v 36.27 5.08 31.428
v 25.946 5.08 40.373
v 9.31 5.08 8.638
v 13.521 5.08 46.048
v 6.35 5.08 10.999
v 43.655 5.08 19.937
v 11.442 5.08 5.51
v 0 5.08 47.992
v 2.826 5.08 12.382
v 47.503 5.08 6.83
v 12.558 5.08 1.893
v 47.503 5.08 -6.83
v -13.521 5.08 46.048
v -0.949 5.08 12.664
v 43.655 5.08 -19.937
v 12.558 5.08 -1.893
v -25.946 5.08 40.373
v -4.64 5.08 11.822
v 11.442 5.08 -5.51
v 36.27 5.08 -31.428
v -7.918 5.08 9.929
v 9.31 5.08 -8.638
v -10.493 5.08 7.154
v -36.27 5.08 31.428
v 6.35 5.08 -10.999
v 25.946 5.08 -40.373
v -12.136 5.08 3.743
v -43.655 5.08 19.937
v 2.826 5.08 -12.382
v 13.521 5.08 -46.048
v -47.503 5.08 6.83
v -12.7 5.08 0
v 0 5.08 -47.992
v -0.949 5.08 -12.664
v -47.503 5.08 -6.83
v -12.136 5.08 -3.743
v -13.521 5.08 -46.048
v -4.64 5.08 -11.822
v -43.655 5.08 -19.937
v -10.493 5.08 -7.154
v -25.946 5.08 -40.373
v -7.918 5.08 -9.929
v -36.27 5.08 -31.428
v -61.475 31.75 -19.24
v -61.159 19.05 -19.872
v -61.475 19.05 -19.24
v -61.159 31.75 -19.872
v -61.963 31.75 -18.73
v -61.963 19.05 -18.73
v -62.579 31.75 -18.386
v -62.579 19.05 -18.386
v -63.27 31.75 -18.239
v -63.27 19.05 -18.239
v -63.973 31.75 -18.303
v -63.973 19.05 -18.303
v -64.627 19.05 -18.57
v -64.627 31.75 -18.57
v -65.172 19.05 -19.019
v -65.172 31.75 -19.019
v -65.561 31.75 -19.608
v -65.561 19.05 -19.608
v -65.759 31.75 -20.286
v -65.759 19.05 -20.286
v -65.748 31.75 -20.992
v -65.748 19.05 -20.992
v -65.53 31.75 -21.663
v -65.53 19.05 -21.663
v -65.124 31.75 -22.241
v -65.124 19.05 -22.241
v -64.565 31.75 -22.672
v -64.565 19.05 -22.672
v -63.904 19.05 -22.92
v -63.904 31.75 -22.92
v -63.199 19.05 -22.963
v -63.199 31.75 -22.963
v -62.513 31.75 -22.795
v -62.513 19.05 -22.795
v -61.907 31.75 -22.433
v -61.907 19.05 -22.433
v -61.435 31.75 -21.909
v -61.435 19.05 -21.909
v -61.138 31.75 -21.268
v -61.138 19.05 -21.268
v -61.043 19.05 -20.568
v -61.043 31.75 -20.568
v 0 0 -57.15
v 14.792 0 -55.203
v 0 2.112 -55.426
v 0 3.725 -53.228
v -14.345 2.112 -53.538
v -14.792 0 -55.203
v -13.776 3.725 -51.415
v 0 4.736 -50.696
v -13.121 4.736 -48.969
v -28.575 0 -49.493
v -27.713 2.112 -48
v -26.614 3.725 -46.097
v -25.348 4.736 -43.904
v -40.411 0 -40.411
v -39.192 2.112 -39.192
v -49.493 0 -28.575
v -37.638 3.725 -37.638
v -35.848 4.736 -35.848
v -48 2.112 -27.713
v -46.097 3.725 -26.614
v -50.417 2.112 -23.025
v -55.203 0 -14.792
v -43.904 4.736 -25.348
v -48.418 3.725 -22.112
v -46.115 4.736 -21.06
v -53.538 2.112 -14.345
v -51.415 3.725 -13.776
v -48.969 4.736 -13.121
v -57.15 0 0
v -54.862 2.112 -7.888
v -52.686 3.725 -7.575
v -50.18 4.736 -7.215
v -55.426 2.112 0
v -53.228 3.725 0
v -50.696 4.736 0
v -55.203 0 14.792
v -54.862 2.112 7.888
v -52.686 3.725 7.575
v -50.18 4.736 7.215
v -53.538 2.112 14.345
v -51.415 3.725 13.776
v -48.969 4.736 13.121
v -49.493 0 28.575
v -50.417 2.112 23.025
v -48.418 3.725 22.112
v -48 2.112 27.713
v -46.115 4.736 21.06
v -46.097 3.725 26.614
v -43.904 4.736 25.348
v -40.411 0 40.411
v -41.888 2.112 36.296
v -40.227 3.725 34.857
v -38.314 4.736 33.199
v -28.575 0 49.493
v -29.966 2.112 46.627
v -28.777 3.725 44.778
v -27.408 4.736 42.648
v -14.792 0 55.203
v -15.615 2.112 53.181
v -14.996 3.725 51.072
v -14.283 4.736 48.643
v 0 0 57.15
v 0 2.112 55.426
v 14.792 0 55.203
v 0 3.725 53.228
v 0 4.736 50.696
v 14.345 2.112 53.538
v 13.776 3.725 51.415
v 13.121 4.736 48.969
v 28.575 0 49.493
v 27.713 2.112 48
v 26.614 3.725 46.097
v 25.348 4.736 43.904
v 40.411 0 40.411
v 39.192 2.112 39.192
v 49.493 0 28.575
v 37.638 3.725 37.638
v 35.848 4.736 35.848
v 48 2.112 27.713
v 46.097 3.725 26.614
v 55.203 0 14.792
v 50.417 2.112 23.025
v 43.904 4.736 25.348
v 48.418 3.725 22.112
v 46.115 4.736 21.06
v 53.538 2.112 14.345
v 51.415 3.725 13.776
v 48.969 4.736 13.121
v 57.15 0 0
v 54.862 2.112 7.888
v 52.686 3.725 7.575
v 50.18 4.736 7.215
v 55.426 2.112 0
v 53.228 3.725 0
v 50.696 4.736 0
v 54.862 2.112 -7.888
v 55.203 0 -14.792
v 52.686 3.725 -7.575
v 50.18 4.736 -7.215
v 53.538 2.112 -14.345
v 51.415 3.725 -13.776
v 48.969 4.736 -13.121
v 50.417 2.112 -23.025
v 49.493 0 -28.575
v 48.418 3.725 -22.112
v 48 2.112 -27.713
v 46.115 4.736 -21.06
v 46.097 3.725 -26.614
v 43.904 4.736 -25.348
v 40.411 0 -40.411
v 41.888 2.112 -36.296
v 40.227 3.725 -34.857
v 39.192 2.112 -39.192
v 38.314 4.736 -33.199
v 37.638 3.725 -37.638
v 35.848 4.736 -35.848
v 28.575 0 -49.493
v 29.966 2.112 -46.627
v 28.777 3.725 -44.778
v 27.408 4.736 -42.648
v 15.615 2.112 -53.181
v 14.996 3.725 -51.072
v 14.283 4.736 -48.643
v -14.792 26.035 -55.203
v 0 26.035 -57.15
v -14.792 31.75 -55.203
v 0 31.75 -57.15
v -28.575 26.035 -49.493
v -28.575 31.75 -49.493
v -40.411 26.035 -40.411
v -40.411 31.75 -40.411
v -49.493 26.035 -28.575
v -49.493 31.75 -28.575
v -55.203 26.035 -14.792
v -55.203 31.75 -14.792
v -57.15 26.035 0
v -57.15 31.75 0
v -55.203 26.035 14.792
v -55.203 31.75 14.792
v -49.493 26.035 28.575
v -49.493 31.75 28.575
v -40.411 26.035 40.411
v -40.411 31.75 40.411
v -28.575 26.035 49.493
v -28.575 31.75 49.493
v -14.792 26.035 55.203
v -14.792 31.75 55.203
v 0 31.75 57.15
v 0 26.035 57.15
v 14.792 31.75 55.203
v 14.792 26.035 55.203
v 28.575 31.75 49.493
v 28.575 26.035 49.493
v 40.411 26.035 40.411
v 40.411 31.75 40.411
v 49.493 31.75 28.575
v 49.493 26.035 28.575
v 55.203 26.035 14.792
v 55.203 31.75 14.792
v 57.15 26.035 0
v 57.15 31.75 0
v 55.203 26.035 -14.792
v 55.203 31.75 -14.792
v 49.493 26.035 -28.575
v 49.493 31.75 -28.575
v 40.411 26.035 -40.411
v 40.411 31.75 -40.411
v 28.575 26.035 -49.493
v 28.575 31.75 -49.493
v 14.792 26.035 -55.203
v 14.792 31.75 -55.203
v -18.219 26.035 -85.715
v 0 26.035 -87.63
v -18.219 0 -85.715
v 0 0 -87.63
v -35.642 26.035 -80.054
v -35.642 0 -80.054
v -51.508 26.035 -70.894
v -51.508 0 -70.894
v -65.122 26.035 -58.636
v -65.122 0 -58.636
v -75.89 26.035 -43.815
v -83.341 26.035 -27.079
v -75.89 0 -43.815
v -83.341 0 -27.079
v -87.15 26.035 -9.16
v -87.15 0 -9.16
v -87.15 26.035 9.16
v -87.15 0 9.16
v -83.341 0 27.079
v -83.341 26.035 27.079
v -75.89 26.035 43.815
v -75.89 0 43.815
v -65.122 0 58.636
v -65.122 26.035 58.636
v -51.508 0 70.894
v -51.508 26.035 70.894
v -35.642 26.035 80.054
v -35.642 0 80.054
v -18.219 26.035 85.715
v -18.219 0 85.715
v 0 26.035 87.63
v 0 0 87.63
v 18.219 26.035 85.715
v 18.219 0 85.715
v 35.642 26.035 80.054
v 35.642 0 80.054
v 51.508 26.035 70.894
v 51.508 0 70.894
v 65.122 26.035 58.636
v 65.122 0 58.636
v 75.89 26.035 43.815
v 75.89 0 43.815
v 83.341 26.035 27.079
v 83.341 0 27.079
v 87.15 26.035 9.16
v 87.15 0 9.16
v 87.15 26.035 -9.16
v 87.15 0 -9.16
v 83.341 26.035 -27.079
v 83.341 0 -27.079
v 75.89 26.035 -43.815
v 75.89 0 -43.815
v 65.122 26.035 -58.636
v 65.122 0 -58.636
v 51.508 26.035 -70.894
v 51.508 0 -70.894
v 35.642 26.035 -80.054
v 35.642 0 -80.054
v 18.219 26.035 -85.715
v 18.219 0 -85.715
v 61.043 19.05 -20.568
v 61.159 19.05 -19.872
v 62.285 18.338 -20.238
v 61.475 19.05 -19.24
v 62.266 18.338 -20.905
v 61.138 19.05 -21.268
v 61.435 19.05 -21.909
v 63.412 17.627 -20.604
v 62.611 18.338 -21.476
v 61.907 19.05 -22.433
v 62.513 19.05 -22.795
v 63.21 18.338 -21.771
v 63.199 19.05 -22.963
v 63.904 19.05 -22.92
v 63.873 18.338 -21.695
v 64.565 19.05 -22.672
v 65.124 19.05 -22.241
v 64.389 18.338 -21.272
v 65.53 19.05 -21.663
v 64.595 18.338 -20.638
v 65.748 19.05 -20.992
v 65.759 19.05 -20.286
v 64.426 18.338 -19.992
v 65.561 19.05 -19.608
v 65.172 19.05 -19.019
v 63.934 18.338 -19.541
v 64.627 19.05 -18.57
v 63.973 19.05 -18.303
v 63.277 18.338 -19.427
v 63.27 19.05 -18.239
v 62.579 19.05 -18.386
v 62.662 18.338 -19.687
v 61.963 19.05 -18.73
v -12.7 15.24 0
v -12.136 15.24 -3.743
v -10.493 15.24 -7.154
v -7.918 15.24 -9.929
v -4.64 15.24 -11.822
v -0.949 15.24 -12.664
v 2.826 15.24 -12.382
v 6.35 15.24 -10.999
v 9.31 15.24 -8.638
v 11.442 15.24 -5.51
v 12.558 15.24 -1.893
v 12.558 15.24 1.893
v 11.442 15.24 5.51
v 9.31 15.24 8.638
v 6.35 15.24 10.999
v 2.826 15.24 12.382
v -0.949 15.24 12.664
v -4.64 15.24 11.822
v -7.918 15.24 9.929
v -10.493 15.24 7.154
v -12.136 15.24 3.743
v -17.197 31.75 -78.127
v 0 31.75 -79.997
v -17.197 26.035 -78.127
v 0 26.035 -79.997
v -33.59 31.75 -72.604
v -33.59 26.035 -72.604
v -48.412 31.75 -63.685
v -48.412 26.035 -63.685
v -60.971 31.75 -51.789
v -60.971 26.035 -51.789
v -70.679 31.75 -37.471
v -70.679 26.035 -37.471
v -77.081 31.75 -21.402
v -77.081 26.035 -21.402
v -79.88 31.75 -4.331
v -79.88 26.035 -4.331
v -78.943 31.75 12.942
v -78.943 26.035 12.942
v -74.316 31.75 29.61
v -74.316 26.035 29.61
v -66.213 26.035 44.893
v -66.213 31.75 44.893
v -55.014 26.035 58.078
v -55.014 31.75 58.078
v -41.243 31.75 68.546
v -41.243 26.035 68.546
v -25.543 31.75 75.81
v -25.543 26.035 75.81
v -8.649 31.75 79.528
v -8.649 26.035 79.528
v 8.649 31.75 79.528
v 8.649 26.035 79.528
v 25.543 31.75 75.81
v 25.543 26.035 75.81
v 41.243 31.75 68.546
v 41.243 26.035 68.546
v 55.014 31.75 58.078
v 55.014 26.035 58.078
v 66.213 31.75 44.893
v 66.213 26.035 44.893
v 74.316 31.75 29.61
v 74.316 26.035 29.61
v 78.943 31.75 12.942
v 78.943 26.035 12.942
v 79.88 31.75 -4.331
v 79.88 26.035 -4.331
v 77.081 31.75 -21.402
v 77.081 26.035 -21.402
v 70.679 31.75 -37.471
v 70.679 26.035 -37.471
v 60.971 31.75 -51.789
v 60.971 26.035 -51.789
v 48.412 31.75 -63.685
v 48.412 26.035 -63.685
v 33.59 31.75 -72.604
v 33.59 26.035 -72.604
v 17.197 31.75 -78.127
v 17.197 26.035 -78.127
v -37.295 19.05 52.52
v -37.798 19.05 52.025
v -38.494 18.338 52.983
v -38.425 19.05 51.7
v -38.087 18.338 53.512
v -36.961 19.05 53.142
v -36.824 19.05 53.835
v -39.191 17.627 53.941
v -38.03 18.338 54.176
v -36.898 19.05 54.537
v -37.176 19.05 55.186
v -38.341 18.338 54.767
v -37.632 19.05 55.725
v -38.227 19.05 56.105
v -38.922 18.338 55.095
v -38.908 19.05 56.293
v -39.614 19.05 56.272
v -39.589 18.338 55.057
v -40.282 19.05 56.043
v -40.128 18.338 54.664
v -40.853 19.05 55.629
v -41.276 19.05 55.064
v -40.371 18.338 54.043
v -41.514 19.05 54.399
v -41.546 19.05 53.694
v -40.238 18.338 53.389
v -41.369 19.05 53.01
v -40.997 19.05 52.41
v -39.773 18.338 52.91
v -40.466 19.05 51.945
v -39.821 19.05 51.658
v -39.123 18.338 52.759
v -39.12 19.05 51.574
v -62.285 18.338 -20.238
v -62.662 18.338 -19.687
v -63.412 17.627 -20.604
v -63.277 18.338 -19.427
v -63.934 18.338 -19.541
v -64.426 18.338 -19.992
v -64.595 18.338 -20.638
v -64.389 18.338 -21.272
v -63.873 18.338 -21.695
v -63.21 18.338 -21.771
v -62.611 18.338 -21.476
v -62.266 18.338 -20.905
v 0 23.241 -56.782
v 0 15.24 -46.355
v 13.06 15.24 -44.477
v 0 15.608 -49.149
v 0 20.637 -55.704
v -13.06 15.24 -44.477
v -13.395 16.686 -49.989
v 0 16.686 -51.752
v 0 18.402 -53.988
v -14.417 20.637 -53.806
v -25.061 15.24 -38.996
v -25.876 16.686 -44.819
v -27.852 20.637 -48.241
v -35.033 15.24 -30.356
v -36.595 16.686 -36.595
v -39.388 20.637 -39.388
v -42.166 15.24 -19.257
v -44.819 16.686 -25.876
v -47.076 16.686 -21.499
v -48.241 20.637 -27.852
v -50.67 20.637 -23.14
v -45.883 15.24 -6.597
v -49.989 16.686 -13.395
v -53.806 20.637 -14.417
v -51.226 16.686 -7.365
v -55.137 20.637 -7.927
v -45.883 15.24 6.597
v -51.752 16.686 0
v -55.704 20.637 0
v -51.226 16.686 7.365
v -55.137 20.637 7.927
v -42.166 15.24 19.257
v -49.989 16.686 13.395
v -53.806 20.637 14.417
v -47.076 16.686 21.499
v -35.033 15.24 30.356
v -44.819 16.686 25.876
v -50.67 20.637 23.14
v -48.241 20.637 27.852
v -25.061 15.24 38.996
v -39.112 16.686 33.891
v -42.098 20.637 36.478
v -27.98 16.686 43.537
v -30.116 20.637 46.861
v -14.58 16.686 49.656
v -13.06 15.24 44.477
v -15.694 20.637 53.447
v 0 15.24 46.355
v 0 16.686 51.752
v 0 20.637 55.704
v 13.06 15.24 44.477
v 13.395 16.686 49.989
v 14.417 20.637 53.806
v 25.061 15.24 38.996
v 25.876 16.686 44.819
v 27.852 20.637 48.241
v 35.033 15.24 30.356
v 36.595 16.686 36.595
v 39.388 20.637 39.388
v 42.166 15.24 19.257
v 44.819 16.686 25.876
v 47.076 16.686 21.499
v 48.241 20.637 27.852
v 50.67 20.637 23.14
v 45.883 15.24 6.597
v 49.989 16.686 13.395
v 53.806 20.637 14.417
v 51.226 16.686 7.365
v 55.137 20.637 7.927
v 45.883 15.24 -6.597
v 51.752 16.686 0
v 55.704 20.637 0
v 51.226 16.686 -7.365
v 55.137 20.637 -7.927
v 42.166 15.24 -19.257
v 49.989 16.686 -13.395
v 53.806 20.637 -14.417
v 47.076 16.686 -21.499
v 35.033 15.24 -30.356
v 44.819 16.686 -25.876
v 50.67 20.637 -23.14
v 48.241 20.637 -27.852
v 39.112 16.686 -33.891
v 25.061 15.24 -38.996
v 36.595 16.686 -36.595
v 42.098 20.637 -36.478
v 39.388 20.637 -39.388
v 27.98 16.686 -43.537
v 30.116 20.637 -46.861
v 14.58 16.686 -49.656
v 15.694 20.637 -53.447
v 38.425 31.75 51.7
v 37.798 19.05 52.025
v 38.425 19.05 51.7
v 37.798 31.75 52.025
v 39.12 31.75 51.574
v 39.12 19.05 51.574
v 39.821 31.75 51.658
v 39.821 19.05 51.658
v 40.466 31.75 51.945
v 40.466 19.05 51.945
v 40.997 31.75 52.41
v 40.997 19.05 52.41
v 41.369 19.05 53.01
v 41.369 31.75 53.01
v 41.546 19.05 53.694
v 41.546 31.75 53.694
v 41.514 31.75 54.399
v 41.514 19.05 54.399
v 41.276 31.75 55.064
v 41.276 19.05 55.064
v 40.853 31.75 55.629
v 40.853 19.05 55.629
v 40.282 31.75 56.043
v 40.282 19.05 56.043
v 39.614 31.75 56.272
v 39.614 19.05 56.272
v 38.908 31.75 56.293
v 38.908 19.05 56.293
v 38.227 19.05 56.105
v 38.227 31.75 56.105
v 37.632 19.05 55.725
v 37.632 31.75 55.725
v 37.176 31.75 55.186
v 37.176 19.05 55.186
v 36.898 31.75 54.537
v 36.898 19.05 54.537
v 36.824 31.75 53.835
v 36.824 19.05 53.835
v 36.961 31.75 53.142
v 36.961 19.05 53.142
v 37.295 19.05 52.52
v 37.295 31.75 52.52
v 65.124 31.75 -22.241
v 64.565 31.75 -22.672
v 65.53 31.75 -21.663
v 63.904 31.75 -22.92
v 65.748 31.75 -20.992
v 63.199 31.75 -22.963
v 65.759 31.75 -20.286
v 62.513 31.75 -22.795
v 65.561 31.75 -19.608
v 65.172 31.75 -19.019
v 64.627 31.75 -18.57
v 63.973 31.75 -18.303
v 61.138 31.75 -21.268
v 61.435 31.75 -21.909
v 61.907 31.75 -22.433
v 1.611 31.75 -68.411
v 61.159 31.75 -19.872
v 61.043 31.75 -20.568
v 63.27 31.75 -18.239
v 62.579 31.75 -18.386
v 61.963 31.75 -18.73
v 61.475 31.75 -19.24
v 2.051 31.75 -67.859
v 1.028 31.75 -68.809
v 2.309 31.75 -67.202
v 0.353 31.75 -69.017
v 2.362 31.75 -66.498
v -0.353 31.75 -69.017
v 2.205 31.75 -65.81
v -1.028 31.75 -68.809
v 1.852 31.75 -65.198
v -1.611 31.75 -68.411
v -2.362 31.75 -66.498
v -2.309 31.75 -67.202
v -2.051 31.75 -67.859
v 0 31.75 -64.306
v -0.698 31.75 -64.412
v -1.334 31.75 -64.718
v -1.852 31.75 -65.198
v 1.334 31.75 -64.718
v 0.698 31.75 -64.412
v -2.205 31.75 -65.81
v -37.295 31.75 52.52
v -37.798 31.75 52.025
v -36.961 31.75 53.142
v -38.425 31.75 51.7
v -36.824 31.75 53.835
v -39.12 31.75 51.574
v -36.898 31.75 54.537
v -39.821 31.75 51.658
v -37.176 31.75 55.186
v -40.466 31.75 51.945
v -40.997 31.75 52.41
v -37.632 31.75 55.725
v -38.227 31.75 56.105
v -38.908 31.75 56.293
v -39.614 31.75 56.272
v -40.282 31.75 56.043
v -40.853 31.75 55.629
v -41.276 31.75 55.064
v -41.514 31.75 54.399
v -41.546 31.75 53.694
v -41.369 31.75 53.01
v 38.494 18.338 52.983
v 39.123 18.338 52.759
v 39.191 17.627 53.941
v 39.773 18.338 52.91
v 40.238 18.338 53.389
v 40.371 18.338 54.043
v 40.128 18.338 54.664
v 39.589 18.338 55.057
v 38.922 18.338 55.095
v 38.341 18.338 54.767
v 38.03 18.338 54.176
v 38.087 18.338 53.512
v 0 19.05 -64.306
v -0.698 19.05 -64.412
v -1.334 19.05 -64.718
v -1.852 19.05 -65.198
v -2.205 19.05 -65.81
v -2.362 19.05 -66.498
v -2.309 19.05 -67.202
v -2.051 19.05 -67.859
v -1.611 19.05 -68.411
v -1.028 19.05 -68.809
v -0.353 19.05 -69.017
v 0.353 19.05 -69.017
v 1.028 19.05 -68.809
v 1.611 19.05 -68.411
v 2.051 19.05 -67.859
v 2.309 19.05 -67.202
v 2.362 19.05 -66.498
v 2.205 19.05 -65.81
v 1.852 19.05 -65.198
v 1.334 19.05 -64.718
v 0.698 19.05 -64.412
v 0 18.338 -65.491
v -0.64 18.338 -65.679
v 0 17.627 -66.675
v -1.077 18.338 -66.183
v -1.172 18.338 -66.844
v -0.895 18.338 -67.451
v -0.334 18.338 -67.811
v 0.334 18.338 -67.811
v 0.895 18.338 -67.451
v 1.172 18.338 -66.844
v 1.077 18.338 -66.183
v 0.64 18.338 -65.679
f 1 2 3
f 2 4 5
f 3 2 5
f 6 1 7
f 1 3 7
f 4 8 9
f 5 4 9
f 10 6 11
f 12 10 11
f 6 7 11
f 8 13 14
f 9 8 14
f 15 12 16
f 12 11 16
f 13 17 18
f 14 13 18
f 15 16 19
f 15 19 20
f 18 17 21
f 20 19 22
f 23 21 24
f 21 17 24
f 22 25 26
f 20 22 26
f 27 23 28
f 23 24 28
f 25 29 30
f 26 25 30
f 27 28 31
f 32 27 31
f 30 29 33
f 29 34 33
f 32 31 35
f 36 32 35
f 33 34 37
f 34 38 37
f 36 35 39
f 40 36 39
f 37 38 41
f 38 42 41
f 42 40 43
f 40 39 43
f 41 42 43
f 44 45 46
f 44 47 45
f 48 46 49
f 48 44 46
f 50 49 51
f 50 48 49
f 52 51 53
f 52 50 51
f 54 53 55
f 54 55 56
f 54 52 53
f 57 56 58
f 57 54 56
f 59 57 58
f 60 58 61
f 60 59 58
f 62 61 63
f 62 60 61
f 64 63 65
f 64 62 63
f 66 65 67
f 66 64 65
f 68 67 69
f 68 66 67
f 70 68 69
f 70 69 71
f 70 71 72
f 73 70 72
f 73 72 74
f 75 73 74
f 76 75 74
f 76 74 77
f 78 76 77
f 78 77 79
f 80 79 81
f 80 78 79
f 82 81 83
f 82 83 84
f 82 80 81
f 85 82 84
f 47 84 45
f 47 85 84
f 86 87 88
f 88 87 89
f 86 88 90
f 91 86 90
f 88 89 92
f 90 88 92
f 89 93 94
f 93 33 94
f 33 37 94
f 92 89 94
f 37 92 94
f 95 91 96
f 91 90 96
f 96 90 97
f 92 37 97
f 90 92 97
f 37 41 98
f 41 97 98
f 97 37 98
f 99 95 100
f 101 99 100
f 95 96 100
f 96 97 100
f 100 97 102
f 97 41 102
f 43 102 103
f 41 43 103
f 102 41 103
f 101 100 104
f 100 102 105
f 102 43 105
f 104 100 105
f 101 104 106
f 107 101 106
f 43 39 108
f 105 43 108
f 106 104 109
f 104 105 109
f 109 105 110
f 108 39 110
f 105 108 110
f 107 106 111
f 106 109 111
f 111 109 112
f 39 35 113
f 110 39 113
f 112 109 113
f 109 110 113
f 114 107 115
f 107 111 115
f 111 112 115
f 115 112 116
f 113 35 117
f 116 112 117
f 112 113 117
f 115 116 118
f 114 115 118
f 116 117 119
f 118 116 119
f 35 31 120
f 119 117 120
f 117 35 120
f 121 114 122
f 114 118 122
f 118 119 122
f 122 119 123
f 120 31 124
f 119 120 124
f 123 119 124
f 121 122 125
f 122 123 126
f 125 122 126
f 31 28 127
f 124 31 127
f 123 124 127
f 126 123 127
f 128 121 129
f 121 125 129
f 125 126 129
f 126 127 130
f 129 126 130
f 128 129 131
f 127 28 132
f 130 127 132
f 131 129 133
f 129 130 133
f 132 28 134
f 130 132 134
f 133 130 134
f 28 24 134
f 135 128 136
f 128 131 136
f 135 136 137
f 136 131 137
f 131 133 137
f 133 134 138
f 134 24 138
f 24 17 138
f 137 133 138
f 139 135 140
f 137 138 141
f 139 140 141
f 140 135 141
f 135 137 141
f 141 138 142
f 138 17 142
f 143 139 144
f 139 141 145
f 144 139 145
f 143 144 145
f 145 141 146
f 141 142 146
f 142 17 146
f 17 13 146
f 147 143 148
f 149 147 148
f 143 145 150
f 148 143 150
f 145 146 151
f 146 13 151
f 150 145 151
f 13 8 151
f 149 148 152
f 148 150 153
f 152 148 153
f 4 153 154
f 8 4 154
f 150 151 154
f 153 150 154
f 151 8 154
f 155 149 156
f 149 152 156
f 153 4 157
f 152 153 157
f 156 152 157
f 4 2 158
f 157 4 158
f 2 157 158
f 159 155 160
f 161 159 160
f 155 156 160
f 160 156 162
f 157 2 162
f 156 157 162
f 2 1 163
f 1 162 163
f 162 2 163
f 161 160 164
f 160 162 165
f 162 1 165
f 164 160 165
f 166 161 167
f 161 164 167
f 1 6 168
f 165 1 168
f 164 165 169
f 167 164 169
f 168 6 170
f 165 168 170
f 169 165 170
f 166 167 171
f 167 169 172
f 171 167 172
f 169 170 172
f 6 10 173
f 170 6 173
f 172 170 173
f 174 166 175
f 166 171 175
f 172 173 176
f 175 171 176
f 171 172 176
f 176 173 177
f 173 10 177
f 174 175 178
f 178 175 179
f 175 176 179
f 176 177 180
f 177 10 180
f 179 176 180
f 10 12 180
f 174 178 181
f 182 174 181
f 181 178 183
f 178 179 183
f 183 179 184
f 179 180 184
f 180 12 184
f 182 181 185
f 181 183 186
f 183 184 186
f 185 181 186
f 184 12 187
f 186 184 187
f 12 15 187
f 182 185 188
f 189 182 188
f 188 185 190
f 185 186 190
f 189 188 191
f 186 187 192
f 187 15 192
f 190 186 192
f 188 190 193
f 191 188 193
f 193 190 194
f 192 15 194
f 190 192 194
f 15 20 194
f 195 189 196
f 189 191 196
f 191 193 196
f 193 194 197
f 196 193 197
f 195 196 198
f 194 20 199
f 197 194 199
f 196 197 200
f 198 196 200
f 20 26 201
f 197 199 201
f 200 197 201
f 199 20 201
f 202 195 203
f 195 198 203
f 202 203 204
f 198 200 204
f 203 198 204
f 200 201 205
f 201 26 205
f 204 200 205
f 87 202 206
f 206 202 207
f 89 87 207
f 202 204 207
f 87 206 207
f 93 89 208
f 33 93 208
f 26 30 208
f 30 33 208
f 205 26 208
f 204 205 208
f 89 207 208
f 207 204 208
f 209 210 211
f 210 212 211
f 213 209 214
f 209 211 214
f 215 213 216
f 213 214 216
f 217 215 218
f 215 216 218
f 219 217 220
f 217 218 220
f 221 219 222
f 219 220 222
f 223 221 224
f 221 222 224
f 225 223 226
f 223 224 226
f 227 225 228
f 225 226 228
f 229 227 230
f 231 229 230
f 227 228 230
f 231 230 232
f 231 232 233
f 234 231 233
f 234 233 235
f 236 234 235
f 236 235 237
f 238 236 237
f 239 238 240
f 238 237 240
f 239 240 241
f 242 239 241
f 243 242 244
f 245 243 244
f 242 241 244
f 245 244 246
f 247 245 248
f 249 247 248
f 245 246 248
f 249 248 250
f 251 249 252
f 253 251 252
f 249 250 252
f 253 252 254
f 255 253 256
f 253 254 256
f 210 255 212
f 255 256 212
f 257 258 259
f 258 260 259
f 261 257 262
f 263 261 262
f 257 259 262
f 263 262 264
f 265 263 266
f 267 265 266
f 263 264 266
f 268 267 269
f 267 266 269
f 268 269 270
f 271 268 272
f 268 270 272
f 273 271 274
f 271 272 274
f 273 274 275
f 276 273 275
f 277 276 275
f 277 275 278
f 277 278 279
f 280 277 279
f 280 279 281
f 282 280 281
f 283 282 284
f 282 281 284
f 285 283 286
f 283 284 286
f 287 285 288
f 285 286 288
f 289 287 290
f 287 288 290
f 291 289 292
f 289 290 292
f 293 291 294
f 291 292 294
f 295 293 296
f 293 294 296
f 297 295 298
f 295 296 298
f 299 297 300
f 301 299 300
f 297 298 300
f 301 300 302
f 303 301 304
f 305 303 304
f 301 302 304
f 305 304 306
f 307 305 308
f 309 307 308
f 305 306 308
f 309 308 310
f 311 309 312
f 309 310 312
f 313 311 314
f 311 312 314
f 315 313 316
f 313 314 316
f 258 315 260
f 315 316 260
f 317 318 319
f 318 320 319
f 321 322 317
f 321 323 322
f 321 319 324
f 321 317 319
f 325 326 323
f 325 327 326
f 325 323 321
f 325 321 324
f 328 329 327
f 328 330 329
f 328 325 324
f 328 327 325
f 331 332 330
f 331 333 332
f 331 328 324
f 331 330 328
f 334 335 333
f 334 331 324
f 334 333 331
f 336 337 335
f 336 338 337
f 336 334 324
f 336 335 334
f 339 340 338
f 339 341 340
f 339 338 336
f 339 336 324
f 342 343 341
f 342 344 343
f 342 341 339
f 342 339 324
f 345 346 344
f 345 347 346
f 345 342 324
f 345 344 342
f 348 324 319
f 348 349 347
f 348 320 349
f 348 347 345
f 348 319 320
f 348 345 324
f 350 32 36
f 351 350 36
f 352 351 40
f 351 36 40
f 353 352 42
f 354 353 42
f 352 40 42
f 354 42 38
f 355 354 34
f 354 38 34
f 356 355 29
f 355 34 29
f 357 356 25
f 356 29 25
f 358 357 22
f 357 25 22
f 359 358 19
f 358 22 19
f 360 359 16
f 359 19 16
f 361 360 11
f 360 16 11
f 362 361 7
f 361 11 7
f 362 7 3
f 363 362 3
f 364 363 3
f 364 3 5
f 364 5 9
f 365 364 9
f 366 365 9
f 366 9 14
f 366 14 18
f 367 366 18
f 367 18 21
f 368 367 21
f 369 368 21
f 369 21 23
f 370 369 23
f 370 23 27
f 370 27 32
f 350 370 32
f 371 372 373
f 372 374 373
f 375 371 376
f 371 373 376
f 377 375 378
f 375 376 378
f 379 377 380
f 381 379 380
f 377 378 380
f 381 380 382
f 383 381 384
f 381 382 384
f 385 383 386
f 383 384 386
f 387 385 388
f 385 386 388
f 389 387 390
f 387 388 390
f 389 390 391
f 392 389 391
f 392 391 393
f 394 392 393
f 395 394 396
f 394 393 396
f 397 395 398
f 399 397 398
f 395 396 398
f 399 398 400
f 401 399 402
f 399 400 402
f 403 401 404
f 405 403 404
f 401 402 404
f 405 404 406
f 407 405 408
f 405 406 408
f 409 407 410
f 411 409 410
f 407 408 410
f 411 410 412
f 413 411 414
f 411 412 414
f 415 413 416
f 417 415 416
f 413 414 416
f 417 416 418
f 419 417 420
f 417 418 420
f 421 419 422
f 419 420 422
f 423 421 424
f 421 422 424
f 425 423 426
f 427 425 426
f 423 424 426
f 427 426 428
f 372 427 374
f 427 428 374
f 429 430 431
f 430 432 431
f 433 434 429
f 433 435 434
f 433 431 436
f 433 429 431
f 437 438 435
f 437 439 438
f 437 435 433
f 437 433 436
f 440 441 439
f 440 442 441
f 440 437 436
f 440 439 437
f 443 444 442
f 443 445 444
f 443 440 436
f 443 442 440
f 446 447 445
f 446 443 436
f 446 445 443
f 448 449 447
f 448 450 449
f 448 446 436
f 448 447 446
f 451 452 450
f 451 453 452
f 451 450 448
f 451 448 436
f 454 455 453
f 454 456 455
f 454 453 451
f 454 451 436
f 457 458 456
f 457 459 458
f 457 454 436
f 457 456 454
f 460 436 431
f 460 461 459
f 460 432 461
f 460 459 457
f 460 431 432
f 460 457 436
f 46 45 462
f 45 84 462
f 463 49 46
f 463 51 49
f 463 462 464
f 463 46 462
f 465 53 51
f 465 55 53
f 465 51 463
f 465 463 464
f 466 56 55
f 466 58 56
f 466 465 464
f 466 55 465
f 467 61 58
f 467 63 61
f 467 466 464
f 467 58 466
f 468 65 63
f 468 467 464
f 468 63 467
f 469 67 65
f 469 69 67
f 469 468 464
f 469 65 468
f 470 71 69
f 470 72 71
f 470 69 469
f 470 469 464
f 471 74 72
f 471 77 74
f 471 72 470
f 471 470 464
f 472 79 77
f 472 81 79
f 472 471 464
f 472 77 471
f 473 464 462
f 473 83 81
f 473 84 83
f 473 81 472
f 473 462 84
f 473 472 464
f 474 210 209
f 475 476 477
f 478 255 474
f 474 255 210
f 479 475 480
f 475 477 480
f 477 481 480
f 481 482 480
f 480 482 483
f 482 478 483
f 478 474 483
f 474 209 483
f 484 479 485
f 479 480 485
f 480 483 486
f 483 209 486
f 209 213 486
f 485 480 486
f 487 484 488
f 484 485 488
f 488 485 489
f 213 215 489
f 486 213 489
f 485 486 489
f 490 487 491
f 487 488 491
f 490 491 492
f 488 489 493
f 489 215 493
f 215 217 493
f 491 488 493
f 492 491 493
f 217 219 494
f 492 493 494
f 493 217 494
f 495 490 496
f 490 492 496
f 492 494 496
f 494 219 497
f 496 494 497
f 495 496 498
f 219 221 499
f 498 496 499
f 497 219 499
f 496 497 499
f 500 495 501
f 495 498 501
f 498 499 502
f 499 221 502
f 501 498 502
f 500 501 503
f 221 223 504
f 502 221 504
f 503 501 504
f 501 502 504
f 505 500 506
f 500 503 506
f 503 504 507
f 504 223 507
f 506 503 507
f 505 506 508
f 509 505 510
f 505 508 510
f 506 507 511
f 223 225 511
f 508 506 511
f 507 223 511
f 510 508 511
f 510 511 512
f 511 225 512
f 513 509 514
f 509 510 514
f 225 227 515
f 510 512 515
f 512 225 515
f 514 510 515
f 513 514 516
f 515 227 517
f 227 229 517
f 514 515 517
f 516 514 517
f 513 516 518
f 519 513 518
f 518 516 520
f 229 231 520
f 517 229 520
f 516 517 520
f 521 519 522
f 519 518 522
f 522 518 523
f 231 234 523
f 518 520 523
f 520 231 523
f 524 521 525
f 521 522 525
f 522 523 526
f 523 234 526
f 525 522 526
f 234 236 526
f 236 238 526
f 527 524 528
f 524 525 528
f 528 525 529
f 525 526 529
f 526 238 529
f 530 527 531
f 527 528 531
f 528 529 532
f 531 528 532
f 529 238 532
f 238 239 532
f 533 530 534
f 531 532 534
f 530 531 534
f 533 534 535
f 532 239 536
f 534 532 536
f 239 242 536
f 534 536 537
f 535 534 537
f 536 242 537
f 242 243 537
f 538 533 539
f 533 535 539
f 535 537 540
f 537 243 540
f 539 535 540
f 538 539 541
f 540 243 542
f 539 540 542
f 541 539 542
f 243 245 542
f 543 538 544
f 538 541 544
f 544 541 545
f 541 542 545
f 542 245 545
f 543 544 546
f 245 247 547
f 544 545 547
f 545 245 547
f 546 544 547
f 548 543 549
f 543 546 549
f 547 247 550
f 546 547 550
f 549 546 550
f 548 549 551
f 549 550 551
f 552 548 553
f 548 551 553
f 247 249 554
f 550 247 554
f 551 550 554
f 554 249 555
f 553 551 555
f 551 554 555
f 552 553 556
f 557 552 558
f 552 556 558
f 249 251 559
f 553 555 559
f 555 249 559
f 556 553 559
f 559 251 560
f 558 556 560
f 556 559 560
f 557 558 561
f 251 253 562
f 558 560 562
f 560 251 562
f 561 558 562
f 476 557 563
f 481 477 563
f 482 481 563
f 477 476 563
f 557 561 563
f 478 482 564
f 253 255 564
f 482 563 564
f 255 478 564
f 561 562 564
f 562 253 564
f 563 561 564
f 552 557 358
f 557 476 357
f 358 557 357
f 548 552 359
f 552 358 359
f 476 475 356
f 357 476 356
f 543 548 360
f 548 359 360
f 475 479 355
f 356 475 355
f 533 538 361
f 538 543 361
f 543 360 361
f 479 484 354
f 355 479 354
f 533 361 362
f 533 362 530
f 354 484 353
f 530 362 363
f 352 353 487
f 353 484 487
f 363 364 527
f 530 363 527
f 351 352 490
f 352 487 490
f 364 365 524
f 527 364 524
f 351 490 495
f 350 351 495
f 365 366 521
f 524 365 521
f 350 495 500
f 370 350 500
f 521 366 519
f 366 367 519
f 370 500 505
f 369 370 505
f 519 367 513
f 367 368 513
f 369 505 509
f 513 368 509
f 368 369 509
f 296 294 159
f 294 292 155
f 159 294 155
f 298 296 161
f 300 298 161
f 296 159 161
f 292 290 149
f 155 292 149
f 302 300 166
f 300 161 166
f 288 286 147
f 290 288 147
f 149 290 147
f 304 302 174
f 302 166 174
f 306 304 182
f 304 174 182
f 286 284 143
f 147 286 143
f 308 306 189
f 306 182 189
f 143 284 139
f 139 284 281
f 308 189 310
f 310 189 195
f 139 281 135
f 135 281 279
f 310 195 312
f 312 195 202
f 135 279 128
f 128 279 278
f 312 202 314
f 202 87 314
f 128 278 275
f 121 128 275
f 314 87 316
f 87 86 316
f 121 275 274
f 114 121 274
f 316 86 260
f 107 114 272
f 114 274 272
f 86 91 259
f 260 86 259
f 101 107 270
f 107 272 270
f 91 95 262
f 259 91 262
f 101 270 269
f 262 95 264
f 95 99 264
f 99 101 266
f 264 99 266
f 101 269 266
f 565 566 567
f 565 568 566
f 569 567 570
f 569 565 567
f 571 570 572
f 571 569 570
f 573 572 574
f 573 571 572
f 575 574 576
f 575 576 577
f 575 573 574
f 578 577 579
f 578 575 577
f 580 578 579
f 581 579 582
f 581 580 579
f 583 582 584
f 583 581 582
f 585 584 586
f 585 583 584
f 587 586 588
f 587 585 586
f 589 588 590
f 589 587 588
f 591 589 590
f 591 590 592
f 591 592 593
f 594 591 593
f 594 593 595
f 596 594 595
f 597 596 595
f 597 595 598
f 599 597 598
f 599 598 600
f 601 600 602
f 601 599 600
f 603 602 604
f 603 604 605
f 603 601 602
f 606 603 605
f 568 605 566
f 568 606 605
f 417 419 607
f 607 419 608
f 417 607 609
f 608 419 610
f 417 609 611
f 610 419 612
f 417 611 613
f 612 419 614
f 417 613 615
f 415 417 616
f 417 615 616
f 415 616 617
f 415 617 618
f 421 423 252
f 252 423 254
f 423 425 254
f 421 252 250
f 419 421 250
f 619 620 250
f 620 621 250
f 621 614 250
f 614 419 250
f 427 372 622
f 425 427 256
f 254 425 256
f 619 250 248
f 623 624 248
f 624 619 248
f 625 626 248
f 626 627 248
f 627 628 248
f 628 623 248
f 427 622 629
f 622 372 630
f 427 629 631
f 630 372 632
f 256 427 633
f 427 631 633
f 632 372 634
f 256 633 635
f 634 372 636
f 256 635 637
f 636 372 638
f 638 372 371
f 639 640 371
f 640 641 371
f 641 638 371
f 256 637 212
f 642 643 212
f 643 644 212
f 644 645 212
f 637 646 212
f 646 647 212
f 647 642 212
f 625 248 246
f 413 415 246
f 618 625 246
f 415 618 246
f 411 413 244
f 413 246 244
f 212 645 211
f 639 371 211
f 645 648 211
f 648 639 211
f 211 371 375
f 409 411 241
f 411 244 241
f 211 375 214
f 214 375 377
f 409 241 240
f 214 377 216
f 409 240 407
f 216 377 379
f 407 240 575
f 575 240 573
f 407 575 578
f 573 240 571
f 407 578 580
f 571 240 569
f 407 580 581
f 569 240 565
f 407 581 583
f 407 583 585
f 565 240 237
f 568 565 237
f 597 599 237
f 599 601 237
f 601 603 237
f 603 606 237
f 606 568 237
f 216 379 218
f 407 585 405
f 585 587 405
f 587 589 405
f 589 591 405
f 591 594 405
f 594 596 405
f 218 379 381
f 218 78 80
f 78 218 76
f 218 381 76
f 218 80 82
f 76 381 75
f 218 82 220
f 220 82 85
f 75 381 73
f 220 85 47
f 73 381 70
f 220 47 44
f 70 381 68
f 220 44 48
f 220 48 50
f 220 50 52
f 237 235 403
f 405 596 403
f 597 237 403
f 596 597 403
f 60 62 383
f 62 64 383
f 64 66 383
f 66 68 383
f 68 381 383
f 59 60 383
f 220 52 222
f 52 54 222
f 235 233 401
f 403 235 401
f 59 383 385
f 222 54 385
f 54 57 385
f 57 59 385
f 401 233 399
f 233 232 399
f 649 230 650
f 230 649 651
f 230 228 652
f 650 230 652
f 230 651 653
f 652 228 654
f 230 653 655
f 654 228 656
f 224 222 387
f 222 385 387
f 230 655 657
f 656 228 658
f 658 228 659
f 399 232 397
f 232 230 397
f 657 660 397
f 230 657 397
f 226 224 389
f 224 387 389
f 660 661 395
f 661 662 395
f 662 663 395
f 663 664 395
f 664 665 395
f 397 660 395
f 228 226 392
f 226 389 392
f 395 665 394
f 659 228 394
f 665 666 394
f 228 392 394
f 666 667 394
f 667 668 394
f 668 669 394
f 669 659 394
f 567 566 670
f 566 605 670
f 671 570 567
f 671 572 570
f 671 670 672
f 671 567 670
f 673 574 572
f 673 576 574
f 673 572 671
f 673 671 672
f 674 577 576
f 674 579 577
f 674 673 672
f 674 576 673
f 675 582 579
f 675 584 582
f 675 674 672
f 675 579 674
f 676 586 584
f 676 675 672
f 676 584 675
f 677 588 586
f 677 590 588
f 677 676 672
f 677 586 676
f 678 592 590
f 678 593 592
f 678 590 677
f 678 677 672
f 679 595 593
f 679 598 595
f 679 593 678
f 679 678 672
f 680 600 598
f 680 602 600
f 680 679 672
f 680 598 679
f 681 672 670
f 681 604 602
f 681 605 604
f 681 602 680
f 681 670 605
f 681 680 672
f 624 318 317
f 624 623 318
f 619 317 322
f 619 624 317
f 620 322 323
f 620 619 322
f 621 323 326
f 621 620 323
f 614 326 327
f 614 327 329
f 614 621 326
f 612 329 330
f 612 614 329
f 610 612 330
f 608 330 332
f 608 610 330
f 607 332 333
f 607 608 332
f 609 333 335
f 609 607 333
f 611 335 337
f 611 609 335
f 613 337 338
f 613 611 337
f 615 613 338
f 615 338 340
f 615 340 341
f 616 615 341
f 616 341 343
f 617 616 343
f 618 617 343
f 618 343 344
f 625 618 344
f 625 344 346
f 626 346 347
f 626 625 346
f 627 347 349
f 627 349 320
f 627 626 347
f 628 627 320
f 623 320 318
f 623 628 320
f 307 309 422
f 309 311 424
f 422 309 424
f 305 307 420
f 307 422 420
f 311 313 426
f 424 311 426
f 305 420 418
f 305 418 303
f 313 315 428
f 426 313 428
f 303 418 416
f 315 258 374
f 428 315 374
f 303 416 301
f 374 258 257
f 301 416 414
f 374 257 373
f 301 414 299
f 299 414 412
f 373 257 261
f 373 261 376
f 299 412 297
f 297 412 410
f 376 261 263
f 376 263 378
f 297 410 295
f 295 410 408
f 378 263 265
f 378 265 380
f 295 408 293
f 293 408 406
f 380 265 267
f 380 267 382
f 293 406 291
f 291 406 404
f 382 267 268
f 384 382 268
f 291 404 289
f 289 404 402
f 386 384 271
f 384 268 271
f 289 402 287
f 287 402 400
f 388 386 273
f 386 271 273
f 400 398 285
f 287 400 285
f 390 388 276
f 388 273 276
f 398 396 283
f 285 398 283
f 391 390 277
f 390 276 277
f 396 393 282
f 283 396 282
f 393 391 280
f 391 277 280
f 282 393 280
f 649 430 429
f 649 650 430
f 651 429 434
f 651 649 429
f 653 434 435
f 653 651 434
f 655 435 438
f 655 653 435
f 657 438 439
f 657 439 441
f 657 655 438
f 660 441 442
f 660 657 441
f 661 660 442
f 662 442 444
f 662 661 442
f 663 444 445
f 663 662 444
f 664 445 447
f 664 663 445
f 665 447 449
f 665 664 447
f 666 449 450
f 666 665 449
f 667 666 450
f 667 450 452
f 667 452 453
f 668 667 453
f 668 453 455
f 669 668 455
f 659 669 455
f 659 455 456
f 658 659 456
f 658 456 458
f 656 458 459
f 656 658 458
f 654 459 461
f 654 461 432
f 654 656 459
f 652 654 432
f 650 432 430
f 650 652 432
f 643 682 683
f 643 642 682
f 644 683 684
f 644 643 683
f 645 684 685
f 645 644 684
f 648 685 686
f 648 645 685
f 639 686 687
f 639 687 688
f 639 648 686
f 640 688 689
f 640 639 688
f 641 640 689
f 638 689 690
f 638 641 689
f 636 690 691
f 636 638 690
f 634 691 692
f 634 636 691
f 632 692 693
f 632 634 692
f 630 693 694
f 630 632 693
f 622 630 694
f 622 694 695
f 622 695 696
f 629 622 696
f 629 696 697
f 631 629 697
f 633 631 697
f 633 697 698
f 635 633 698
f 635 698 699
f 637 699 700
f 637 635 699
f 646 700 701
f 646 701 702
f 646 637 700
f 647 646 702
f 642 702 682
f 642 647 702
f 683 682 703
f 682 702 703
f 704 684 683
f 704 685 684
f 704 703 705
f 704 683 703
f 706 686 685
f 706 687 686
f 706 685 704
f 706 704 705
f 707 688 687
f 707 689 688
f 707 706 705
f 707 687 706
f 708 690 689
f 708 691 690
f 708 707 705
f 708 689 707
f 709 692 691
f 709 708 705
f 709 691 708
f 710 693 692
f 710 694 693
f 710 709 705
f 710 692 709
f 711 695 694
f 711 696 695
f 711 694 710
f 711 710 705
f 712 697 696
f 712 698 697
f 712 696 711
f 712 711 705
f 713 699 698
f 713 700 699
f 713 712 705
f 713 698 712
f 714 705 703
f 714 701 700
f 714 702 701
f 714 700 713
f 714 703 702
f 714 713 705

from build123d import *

# Parameters (mm, degrees)
F_1_1_DIAMETER_HOLE1_D = 25.4
CIRPATTERN1_COUNT      = 5
FILLET2_R              = 10.795


with BuildPart() as part:
    # Sketch1 → Revolve1 (revolve)
    with BuildSketch(Plane.XY, mode=Mode.PRIVATE) as revolve1_sk:
        Polygon((87.63, 0), (57.15, 0), (57.15, 5.08), (0, 5.08), (0, 15.24), (57.15, 15.24), (57.15, 31.75), (79.9973, 31.75), (79.9973, 26.035), (87.63, 26.035), align=None)
    revolve(revolve1_sk.sketch.rotate(Axis((0, 5.08, 0), (0, 1, 0)), 90), axis=Axis((0, 5.08, 0), (0, 1, 0)))

    # 1 (1) Diameter Hole1 (through all)
    with Locations(Plane(origin=(0, 15.24, 0), x_dir=(1, 0, 0), z_dir=(0, 1, 0))):
        with Locations((0, 0)):
            Hole(F_1_1_DIAMETER_HOLE1_D / 2)

    # Sketch7 → 3/16 (0.1865) Dowel Hole1 (revolve, cut)
    with BuildSketch(Plane(origin=(0, 31.75, -66.675), x_dir=(0, 0, 1), z_dir=(1, 0, 0))):
        Polygon((0, 0), (0, 14.123168419), (2.36855, 12.7), (2.36855, 0), align=None)
    f_3_16_0_1865_dowel_hole1 = revolve(axis=Axis((0, 38.1, -66.675), (0, -1, 0)), mode=Mode.SUBTRACT)

    # CirPattern1: 3/16 (0.1865) Dowel Hole1 ×5 about axis
    cirpattern1_axis = Axis((0, 0, 0), (0, 1, 0))
    for i in range(1, CIRPATTERN1_COUNT):
        add(f_3_16_0_1865_dowel_hole1.rotate(cirpattern1_axis, i * 360 / CIRPATTERN1_COUNT), mode=Mode.SUBTRACT)

    # Fillet2
    # the kernel refuses this fillet: 10.795 mm, written as the material it adds along each edge
    with BuildSketch(Plane(origin=(0, 5.08, 0), x_dir=(0, 0, -1), z_dir=(1, 0, 0))) as fillet2_piece_1:
        with BuildLine():
            CenterArc((47.99189976, -10.795), FILLET2_R, 31.965718751, 58.034281249)
            Line((47.99189976, 0), (47.99189976, 0.2159))
            Line((47.99189976, 0.2159), (57.15, 0.2159))
            Line((57.15, 0.2159), (57.3659, 0))
            ThreePointArc((57.3659, 0), (57.3659, -2.54), (57.333162005, -4.9657))
            Line((57.333162005, -4.9657), (57.15, -5.08))
        make_face()
    revolve(axis=Axis((0, 5.08, 0), (0, 1, 0)))
    with BuildSketch(Plane(origin=(0, 15.24, 0), x_dir=(0, 0, -1), z_dir=(1, 0, 0))) as fillet2_piece_2:
        with BuildLine():
            CenterArc((57.15 - FILLET2_R, FILLET2_R), FILLET2_R, 270, 90)
            Line((57.15, FILLET2_R), (57.15 + FILLET2_R * 0.02, FILLET2_R))
            Line((57.15 + FILLET2_R * 0.02, FILLET2_R), (57.15 + FILLET2_R * 0.02, -FILLET2_R * 0.02))
            Line((57.15 + FILLET2_R * 0.02, -FILLET2_R * 0.02), (57.15 - FILLET2_R, -FILLET2_R * 0.02))
            Line((57.15 - FILLET2_R, -FILLET2_R * 0.02), (57.15 - FILLET2_R, 0))
        make_face()
    revolve(axis=Axis((0, 15.24, 0), (0, 1, 0)))


solid = part.part
